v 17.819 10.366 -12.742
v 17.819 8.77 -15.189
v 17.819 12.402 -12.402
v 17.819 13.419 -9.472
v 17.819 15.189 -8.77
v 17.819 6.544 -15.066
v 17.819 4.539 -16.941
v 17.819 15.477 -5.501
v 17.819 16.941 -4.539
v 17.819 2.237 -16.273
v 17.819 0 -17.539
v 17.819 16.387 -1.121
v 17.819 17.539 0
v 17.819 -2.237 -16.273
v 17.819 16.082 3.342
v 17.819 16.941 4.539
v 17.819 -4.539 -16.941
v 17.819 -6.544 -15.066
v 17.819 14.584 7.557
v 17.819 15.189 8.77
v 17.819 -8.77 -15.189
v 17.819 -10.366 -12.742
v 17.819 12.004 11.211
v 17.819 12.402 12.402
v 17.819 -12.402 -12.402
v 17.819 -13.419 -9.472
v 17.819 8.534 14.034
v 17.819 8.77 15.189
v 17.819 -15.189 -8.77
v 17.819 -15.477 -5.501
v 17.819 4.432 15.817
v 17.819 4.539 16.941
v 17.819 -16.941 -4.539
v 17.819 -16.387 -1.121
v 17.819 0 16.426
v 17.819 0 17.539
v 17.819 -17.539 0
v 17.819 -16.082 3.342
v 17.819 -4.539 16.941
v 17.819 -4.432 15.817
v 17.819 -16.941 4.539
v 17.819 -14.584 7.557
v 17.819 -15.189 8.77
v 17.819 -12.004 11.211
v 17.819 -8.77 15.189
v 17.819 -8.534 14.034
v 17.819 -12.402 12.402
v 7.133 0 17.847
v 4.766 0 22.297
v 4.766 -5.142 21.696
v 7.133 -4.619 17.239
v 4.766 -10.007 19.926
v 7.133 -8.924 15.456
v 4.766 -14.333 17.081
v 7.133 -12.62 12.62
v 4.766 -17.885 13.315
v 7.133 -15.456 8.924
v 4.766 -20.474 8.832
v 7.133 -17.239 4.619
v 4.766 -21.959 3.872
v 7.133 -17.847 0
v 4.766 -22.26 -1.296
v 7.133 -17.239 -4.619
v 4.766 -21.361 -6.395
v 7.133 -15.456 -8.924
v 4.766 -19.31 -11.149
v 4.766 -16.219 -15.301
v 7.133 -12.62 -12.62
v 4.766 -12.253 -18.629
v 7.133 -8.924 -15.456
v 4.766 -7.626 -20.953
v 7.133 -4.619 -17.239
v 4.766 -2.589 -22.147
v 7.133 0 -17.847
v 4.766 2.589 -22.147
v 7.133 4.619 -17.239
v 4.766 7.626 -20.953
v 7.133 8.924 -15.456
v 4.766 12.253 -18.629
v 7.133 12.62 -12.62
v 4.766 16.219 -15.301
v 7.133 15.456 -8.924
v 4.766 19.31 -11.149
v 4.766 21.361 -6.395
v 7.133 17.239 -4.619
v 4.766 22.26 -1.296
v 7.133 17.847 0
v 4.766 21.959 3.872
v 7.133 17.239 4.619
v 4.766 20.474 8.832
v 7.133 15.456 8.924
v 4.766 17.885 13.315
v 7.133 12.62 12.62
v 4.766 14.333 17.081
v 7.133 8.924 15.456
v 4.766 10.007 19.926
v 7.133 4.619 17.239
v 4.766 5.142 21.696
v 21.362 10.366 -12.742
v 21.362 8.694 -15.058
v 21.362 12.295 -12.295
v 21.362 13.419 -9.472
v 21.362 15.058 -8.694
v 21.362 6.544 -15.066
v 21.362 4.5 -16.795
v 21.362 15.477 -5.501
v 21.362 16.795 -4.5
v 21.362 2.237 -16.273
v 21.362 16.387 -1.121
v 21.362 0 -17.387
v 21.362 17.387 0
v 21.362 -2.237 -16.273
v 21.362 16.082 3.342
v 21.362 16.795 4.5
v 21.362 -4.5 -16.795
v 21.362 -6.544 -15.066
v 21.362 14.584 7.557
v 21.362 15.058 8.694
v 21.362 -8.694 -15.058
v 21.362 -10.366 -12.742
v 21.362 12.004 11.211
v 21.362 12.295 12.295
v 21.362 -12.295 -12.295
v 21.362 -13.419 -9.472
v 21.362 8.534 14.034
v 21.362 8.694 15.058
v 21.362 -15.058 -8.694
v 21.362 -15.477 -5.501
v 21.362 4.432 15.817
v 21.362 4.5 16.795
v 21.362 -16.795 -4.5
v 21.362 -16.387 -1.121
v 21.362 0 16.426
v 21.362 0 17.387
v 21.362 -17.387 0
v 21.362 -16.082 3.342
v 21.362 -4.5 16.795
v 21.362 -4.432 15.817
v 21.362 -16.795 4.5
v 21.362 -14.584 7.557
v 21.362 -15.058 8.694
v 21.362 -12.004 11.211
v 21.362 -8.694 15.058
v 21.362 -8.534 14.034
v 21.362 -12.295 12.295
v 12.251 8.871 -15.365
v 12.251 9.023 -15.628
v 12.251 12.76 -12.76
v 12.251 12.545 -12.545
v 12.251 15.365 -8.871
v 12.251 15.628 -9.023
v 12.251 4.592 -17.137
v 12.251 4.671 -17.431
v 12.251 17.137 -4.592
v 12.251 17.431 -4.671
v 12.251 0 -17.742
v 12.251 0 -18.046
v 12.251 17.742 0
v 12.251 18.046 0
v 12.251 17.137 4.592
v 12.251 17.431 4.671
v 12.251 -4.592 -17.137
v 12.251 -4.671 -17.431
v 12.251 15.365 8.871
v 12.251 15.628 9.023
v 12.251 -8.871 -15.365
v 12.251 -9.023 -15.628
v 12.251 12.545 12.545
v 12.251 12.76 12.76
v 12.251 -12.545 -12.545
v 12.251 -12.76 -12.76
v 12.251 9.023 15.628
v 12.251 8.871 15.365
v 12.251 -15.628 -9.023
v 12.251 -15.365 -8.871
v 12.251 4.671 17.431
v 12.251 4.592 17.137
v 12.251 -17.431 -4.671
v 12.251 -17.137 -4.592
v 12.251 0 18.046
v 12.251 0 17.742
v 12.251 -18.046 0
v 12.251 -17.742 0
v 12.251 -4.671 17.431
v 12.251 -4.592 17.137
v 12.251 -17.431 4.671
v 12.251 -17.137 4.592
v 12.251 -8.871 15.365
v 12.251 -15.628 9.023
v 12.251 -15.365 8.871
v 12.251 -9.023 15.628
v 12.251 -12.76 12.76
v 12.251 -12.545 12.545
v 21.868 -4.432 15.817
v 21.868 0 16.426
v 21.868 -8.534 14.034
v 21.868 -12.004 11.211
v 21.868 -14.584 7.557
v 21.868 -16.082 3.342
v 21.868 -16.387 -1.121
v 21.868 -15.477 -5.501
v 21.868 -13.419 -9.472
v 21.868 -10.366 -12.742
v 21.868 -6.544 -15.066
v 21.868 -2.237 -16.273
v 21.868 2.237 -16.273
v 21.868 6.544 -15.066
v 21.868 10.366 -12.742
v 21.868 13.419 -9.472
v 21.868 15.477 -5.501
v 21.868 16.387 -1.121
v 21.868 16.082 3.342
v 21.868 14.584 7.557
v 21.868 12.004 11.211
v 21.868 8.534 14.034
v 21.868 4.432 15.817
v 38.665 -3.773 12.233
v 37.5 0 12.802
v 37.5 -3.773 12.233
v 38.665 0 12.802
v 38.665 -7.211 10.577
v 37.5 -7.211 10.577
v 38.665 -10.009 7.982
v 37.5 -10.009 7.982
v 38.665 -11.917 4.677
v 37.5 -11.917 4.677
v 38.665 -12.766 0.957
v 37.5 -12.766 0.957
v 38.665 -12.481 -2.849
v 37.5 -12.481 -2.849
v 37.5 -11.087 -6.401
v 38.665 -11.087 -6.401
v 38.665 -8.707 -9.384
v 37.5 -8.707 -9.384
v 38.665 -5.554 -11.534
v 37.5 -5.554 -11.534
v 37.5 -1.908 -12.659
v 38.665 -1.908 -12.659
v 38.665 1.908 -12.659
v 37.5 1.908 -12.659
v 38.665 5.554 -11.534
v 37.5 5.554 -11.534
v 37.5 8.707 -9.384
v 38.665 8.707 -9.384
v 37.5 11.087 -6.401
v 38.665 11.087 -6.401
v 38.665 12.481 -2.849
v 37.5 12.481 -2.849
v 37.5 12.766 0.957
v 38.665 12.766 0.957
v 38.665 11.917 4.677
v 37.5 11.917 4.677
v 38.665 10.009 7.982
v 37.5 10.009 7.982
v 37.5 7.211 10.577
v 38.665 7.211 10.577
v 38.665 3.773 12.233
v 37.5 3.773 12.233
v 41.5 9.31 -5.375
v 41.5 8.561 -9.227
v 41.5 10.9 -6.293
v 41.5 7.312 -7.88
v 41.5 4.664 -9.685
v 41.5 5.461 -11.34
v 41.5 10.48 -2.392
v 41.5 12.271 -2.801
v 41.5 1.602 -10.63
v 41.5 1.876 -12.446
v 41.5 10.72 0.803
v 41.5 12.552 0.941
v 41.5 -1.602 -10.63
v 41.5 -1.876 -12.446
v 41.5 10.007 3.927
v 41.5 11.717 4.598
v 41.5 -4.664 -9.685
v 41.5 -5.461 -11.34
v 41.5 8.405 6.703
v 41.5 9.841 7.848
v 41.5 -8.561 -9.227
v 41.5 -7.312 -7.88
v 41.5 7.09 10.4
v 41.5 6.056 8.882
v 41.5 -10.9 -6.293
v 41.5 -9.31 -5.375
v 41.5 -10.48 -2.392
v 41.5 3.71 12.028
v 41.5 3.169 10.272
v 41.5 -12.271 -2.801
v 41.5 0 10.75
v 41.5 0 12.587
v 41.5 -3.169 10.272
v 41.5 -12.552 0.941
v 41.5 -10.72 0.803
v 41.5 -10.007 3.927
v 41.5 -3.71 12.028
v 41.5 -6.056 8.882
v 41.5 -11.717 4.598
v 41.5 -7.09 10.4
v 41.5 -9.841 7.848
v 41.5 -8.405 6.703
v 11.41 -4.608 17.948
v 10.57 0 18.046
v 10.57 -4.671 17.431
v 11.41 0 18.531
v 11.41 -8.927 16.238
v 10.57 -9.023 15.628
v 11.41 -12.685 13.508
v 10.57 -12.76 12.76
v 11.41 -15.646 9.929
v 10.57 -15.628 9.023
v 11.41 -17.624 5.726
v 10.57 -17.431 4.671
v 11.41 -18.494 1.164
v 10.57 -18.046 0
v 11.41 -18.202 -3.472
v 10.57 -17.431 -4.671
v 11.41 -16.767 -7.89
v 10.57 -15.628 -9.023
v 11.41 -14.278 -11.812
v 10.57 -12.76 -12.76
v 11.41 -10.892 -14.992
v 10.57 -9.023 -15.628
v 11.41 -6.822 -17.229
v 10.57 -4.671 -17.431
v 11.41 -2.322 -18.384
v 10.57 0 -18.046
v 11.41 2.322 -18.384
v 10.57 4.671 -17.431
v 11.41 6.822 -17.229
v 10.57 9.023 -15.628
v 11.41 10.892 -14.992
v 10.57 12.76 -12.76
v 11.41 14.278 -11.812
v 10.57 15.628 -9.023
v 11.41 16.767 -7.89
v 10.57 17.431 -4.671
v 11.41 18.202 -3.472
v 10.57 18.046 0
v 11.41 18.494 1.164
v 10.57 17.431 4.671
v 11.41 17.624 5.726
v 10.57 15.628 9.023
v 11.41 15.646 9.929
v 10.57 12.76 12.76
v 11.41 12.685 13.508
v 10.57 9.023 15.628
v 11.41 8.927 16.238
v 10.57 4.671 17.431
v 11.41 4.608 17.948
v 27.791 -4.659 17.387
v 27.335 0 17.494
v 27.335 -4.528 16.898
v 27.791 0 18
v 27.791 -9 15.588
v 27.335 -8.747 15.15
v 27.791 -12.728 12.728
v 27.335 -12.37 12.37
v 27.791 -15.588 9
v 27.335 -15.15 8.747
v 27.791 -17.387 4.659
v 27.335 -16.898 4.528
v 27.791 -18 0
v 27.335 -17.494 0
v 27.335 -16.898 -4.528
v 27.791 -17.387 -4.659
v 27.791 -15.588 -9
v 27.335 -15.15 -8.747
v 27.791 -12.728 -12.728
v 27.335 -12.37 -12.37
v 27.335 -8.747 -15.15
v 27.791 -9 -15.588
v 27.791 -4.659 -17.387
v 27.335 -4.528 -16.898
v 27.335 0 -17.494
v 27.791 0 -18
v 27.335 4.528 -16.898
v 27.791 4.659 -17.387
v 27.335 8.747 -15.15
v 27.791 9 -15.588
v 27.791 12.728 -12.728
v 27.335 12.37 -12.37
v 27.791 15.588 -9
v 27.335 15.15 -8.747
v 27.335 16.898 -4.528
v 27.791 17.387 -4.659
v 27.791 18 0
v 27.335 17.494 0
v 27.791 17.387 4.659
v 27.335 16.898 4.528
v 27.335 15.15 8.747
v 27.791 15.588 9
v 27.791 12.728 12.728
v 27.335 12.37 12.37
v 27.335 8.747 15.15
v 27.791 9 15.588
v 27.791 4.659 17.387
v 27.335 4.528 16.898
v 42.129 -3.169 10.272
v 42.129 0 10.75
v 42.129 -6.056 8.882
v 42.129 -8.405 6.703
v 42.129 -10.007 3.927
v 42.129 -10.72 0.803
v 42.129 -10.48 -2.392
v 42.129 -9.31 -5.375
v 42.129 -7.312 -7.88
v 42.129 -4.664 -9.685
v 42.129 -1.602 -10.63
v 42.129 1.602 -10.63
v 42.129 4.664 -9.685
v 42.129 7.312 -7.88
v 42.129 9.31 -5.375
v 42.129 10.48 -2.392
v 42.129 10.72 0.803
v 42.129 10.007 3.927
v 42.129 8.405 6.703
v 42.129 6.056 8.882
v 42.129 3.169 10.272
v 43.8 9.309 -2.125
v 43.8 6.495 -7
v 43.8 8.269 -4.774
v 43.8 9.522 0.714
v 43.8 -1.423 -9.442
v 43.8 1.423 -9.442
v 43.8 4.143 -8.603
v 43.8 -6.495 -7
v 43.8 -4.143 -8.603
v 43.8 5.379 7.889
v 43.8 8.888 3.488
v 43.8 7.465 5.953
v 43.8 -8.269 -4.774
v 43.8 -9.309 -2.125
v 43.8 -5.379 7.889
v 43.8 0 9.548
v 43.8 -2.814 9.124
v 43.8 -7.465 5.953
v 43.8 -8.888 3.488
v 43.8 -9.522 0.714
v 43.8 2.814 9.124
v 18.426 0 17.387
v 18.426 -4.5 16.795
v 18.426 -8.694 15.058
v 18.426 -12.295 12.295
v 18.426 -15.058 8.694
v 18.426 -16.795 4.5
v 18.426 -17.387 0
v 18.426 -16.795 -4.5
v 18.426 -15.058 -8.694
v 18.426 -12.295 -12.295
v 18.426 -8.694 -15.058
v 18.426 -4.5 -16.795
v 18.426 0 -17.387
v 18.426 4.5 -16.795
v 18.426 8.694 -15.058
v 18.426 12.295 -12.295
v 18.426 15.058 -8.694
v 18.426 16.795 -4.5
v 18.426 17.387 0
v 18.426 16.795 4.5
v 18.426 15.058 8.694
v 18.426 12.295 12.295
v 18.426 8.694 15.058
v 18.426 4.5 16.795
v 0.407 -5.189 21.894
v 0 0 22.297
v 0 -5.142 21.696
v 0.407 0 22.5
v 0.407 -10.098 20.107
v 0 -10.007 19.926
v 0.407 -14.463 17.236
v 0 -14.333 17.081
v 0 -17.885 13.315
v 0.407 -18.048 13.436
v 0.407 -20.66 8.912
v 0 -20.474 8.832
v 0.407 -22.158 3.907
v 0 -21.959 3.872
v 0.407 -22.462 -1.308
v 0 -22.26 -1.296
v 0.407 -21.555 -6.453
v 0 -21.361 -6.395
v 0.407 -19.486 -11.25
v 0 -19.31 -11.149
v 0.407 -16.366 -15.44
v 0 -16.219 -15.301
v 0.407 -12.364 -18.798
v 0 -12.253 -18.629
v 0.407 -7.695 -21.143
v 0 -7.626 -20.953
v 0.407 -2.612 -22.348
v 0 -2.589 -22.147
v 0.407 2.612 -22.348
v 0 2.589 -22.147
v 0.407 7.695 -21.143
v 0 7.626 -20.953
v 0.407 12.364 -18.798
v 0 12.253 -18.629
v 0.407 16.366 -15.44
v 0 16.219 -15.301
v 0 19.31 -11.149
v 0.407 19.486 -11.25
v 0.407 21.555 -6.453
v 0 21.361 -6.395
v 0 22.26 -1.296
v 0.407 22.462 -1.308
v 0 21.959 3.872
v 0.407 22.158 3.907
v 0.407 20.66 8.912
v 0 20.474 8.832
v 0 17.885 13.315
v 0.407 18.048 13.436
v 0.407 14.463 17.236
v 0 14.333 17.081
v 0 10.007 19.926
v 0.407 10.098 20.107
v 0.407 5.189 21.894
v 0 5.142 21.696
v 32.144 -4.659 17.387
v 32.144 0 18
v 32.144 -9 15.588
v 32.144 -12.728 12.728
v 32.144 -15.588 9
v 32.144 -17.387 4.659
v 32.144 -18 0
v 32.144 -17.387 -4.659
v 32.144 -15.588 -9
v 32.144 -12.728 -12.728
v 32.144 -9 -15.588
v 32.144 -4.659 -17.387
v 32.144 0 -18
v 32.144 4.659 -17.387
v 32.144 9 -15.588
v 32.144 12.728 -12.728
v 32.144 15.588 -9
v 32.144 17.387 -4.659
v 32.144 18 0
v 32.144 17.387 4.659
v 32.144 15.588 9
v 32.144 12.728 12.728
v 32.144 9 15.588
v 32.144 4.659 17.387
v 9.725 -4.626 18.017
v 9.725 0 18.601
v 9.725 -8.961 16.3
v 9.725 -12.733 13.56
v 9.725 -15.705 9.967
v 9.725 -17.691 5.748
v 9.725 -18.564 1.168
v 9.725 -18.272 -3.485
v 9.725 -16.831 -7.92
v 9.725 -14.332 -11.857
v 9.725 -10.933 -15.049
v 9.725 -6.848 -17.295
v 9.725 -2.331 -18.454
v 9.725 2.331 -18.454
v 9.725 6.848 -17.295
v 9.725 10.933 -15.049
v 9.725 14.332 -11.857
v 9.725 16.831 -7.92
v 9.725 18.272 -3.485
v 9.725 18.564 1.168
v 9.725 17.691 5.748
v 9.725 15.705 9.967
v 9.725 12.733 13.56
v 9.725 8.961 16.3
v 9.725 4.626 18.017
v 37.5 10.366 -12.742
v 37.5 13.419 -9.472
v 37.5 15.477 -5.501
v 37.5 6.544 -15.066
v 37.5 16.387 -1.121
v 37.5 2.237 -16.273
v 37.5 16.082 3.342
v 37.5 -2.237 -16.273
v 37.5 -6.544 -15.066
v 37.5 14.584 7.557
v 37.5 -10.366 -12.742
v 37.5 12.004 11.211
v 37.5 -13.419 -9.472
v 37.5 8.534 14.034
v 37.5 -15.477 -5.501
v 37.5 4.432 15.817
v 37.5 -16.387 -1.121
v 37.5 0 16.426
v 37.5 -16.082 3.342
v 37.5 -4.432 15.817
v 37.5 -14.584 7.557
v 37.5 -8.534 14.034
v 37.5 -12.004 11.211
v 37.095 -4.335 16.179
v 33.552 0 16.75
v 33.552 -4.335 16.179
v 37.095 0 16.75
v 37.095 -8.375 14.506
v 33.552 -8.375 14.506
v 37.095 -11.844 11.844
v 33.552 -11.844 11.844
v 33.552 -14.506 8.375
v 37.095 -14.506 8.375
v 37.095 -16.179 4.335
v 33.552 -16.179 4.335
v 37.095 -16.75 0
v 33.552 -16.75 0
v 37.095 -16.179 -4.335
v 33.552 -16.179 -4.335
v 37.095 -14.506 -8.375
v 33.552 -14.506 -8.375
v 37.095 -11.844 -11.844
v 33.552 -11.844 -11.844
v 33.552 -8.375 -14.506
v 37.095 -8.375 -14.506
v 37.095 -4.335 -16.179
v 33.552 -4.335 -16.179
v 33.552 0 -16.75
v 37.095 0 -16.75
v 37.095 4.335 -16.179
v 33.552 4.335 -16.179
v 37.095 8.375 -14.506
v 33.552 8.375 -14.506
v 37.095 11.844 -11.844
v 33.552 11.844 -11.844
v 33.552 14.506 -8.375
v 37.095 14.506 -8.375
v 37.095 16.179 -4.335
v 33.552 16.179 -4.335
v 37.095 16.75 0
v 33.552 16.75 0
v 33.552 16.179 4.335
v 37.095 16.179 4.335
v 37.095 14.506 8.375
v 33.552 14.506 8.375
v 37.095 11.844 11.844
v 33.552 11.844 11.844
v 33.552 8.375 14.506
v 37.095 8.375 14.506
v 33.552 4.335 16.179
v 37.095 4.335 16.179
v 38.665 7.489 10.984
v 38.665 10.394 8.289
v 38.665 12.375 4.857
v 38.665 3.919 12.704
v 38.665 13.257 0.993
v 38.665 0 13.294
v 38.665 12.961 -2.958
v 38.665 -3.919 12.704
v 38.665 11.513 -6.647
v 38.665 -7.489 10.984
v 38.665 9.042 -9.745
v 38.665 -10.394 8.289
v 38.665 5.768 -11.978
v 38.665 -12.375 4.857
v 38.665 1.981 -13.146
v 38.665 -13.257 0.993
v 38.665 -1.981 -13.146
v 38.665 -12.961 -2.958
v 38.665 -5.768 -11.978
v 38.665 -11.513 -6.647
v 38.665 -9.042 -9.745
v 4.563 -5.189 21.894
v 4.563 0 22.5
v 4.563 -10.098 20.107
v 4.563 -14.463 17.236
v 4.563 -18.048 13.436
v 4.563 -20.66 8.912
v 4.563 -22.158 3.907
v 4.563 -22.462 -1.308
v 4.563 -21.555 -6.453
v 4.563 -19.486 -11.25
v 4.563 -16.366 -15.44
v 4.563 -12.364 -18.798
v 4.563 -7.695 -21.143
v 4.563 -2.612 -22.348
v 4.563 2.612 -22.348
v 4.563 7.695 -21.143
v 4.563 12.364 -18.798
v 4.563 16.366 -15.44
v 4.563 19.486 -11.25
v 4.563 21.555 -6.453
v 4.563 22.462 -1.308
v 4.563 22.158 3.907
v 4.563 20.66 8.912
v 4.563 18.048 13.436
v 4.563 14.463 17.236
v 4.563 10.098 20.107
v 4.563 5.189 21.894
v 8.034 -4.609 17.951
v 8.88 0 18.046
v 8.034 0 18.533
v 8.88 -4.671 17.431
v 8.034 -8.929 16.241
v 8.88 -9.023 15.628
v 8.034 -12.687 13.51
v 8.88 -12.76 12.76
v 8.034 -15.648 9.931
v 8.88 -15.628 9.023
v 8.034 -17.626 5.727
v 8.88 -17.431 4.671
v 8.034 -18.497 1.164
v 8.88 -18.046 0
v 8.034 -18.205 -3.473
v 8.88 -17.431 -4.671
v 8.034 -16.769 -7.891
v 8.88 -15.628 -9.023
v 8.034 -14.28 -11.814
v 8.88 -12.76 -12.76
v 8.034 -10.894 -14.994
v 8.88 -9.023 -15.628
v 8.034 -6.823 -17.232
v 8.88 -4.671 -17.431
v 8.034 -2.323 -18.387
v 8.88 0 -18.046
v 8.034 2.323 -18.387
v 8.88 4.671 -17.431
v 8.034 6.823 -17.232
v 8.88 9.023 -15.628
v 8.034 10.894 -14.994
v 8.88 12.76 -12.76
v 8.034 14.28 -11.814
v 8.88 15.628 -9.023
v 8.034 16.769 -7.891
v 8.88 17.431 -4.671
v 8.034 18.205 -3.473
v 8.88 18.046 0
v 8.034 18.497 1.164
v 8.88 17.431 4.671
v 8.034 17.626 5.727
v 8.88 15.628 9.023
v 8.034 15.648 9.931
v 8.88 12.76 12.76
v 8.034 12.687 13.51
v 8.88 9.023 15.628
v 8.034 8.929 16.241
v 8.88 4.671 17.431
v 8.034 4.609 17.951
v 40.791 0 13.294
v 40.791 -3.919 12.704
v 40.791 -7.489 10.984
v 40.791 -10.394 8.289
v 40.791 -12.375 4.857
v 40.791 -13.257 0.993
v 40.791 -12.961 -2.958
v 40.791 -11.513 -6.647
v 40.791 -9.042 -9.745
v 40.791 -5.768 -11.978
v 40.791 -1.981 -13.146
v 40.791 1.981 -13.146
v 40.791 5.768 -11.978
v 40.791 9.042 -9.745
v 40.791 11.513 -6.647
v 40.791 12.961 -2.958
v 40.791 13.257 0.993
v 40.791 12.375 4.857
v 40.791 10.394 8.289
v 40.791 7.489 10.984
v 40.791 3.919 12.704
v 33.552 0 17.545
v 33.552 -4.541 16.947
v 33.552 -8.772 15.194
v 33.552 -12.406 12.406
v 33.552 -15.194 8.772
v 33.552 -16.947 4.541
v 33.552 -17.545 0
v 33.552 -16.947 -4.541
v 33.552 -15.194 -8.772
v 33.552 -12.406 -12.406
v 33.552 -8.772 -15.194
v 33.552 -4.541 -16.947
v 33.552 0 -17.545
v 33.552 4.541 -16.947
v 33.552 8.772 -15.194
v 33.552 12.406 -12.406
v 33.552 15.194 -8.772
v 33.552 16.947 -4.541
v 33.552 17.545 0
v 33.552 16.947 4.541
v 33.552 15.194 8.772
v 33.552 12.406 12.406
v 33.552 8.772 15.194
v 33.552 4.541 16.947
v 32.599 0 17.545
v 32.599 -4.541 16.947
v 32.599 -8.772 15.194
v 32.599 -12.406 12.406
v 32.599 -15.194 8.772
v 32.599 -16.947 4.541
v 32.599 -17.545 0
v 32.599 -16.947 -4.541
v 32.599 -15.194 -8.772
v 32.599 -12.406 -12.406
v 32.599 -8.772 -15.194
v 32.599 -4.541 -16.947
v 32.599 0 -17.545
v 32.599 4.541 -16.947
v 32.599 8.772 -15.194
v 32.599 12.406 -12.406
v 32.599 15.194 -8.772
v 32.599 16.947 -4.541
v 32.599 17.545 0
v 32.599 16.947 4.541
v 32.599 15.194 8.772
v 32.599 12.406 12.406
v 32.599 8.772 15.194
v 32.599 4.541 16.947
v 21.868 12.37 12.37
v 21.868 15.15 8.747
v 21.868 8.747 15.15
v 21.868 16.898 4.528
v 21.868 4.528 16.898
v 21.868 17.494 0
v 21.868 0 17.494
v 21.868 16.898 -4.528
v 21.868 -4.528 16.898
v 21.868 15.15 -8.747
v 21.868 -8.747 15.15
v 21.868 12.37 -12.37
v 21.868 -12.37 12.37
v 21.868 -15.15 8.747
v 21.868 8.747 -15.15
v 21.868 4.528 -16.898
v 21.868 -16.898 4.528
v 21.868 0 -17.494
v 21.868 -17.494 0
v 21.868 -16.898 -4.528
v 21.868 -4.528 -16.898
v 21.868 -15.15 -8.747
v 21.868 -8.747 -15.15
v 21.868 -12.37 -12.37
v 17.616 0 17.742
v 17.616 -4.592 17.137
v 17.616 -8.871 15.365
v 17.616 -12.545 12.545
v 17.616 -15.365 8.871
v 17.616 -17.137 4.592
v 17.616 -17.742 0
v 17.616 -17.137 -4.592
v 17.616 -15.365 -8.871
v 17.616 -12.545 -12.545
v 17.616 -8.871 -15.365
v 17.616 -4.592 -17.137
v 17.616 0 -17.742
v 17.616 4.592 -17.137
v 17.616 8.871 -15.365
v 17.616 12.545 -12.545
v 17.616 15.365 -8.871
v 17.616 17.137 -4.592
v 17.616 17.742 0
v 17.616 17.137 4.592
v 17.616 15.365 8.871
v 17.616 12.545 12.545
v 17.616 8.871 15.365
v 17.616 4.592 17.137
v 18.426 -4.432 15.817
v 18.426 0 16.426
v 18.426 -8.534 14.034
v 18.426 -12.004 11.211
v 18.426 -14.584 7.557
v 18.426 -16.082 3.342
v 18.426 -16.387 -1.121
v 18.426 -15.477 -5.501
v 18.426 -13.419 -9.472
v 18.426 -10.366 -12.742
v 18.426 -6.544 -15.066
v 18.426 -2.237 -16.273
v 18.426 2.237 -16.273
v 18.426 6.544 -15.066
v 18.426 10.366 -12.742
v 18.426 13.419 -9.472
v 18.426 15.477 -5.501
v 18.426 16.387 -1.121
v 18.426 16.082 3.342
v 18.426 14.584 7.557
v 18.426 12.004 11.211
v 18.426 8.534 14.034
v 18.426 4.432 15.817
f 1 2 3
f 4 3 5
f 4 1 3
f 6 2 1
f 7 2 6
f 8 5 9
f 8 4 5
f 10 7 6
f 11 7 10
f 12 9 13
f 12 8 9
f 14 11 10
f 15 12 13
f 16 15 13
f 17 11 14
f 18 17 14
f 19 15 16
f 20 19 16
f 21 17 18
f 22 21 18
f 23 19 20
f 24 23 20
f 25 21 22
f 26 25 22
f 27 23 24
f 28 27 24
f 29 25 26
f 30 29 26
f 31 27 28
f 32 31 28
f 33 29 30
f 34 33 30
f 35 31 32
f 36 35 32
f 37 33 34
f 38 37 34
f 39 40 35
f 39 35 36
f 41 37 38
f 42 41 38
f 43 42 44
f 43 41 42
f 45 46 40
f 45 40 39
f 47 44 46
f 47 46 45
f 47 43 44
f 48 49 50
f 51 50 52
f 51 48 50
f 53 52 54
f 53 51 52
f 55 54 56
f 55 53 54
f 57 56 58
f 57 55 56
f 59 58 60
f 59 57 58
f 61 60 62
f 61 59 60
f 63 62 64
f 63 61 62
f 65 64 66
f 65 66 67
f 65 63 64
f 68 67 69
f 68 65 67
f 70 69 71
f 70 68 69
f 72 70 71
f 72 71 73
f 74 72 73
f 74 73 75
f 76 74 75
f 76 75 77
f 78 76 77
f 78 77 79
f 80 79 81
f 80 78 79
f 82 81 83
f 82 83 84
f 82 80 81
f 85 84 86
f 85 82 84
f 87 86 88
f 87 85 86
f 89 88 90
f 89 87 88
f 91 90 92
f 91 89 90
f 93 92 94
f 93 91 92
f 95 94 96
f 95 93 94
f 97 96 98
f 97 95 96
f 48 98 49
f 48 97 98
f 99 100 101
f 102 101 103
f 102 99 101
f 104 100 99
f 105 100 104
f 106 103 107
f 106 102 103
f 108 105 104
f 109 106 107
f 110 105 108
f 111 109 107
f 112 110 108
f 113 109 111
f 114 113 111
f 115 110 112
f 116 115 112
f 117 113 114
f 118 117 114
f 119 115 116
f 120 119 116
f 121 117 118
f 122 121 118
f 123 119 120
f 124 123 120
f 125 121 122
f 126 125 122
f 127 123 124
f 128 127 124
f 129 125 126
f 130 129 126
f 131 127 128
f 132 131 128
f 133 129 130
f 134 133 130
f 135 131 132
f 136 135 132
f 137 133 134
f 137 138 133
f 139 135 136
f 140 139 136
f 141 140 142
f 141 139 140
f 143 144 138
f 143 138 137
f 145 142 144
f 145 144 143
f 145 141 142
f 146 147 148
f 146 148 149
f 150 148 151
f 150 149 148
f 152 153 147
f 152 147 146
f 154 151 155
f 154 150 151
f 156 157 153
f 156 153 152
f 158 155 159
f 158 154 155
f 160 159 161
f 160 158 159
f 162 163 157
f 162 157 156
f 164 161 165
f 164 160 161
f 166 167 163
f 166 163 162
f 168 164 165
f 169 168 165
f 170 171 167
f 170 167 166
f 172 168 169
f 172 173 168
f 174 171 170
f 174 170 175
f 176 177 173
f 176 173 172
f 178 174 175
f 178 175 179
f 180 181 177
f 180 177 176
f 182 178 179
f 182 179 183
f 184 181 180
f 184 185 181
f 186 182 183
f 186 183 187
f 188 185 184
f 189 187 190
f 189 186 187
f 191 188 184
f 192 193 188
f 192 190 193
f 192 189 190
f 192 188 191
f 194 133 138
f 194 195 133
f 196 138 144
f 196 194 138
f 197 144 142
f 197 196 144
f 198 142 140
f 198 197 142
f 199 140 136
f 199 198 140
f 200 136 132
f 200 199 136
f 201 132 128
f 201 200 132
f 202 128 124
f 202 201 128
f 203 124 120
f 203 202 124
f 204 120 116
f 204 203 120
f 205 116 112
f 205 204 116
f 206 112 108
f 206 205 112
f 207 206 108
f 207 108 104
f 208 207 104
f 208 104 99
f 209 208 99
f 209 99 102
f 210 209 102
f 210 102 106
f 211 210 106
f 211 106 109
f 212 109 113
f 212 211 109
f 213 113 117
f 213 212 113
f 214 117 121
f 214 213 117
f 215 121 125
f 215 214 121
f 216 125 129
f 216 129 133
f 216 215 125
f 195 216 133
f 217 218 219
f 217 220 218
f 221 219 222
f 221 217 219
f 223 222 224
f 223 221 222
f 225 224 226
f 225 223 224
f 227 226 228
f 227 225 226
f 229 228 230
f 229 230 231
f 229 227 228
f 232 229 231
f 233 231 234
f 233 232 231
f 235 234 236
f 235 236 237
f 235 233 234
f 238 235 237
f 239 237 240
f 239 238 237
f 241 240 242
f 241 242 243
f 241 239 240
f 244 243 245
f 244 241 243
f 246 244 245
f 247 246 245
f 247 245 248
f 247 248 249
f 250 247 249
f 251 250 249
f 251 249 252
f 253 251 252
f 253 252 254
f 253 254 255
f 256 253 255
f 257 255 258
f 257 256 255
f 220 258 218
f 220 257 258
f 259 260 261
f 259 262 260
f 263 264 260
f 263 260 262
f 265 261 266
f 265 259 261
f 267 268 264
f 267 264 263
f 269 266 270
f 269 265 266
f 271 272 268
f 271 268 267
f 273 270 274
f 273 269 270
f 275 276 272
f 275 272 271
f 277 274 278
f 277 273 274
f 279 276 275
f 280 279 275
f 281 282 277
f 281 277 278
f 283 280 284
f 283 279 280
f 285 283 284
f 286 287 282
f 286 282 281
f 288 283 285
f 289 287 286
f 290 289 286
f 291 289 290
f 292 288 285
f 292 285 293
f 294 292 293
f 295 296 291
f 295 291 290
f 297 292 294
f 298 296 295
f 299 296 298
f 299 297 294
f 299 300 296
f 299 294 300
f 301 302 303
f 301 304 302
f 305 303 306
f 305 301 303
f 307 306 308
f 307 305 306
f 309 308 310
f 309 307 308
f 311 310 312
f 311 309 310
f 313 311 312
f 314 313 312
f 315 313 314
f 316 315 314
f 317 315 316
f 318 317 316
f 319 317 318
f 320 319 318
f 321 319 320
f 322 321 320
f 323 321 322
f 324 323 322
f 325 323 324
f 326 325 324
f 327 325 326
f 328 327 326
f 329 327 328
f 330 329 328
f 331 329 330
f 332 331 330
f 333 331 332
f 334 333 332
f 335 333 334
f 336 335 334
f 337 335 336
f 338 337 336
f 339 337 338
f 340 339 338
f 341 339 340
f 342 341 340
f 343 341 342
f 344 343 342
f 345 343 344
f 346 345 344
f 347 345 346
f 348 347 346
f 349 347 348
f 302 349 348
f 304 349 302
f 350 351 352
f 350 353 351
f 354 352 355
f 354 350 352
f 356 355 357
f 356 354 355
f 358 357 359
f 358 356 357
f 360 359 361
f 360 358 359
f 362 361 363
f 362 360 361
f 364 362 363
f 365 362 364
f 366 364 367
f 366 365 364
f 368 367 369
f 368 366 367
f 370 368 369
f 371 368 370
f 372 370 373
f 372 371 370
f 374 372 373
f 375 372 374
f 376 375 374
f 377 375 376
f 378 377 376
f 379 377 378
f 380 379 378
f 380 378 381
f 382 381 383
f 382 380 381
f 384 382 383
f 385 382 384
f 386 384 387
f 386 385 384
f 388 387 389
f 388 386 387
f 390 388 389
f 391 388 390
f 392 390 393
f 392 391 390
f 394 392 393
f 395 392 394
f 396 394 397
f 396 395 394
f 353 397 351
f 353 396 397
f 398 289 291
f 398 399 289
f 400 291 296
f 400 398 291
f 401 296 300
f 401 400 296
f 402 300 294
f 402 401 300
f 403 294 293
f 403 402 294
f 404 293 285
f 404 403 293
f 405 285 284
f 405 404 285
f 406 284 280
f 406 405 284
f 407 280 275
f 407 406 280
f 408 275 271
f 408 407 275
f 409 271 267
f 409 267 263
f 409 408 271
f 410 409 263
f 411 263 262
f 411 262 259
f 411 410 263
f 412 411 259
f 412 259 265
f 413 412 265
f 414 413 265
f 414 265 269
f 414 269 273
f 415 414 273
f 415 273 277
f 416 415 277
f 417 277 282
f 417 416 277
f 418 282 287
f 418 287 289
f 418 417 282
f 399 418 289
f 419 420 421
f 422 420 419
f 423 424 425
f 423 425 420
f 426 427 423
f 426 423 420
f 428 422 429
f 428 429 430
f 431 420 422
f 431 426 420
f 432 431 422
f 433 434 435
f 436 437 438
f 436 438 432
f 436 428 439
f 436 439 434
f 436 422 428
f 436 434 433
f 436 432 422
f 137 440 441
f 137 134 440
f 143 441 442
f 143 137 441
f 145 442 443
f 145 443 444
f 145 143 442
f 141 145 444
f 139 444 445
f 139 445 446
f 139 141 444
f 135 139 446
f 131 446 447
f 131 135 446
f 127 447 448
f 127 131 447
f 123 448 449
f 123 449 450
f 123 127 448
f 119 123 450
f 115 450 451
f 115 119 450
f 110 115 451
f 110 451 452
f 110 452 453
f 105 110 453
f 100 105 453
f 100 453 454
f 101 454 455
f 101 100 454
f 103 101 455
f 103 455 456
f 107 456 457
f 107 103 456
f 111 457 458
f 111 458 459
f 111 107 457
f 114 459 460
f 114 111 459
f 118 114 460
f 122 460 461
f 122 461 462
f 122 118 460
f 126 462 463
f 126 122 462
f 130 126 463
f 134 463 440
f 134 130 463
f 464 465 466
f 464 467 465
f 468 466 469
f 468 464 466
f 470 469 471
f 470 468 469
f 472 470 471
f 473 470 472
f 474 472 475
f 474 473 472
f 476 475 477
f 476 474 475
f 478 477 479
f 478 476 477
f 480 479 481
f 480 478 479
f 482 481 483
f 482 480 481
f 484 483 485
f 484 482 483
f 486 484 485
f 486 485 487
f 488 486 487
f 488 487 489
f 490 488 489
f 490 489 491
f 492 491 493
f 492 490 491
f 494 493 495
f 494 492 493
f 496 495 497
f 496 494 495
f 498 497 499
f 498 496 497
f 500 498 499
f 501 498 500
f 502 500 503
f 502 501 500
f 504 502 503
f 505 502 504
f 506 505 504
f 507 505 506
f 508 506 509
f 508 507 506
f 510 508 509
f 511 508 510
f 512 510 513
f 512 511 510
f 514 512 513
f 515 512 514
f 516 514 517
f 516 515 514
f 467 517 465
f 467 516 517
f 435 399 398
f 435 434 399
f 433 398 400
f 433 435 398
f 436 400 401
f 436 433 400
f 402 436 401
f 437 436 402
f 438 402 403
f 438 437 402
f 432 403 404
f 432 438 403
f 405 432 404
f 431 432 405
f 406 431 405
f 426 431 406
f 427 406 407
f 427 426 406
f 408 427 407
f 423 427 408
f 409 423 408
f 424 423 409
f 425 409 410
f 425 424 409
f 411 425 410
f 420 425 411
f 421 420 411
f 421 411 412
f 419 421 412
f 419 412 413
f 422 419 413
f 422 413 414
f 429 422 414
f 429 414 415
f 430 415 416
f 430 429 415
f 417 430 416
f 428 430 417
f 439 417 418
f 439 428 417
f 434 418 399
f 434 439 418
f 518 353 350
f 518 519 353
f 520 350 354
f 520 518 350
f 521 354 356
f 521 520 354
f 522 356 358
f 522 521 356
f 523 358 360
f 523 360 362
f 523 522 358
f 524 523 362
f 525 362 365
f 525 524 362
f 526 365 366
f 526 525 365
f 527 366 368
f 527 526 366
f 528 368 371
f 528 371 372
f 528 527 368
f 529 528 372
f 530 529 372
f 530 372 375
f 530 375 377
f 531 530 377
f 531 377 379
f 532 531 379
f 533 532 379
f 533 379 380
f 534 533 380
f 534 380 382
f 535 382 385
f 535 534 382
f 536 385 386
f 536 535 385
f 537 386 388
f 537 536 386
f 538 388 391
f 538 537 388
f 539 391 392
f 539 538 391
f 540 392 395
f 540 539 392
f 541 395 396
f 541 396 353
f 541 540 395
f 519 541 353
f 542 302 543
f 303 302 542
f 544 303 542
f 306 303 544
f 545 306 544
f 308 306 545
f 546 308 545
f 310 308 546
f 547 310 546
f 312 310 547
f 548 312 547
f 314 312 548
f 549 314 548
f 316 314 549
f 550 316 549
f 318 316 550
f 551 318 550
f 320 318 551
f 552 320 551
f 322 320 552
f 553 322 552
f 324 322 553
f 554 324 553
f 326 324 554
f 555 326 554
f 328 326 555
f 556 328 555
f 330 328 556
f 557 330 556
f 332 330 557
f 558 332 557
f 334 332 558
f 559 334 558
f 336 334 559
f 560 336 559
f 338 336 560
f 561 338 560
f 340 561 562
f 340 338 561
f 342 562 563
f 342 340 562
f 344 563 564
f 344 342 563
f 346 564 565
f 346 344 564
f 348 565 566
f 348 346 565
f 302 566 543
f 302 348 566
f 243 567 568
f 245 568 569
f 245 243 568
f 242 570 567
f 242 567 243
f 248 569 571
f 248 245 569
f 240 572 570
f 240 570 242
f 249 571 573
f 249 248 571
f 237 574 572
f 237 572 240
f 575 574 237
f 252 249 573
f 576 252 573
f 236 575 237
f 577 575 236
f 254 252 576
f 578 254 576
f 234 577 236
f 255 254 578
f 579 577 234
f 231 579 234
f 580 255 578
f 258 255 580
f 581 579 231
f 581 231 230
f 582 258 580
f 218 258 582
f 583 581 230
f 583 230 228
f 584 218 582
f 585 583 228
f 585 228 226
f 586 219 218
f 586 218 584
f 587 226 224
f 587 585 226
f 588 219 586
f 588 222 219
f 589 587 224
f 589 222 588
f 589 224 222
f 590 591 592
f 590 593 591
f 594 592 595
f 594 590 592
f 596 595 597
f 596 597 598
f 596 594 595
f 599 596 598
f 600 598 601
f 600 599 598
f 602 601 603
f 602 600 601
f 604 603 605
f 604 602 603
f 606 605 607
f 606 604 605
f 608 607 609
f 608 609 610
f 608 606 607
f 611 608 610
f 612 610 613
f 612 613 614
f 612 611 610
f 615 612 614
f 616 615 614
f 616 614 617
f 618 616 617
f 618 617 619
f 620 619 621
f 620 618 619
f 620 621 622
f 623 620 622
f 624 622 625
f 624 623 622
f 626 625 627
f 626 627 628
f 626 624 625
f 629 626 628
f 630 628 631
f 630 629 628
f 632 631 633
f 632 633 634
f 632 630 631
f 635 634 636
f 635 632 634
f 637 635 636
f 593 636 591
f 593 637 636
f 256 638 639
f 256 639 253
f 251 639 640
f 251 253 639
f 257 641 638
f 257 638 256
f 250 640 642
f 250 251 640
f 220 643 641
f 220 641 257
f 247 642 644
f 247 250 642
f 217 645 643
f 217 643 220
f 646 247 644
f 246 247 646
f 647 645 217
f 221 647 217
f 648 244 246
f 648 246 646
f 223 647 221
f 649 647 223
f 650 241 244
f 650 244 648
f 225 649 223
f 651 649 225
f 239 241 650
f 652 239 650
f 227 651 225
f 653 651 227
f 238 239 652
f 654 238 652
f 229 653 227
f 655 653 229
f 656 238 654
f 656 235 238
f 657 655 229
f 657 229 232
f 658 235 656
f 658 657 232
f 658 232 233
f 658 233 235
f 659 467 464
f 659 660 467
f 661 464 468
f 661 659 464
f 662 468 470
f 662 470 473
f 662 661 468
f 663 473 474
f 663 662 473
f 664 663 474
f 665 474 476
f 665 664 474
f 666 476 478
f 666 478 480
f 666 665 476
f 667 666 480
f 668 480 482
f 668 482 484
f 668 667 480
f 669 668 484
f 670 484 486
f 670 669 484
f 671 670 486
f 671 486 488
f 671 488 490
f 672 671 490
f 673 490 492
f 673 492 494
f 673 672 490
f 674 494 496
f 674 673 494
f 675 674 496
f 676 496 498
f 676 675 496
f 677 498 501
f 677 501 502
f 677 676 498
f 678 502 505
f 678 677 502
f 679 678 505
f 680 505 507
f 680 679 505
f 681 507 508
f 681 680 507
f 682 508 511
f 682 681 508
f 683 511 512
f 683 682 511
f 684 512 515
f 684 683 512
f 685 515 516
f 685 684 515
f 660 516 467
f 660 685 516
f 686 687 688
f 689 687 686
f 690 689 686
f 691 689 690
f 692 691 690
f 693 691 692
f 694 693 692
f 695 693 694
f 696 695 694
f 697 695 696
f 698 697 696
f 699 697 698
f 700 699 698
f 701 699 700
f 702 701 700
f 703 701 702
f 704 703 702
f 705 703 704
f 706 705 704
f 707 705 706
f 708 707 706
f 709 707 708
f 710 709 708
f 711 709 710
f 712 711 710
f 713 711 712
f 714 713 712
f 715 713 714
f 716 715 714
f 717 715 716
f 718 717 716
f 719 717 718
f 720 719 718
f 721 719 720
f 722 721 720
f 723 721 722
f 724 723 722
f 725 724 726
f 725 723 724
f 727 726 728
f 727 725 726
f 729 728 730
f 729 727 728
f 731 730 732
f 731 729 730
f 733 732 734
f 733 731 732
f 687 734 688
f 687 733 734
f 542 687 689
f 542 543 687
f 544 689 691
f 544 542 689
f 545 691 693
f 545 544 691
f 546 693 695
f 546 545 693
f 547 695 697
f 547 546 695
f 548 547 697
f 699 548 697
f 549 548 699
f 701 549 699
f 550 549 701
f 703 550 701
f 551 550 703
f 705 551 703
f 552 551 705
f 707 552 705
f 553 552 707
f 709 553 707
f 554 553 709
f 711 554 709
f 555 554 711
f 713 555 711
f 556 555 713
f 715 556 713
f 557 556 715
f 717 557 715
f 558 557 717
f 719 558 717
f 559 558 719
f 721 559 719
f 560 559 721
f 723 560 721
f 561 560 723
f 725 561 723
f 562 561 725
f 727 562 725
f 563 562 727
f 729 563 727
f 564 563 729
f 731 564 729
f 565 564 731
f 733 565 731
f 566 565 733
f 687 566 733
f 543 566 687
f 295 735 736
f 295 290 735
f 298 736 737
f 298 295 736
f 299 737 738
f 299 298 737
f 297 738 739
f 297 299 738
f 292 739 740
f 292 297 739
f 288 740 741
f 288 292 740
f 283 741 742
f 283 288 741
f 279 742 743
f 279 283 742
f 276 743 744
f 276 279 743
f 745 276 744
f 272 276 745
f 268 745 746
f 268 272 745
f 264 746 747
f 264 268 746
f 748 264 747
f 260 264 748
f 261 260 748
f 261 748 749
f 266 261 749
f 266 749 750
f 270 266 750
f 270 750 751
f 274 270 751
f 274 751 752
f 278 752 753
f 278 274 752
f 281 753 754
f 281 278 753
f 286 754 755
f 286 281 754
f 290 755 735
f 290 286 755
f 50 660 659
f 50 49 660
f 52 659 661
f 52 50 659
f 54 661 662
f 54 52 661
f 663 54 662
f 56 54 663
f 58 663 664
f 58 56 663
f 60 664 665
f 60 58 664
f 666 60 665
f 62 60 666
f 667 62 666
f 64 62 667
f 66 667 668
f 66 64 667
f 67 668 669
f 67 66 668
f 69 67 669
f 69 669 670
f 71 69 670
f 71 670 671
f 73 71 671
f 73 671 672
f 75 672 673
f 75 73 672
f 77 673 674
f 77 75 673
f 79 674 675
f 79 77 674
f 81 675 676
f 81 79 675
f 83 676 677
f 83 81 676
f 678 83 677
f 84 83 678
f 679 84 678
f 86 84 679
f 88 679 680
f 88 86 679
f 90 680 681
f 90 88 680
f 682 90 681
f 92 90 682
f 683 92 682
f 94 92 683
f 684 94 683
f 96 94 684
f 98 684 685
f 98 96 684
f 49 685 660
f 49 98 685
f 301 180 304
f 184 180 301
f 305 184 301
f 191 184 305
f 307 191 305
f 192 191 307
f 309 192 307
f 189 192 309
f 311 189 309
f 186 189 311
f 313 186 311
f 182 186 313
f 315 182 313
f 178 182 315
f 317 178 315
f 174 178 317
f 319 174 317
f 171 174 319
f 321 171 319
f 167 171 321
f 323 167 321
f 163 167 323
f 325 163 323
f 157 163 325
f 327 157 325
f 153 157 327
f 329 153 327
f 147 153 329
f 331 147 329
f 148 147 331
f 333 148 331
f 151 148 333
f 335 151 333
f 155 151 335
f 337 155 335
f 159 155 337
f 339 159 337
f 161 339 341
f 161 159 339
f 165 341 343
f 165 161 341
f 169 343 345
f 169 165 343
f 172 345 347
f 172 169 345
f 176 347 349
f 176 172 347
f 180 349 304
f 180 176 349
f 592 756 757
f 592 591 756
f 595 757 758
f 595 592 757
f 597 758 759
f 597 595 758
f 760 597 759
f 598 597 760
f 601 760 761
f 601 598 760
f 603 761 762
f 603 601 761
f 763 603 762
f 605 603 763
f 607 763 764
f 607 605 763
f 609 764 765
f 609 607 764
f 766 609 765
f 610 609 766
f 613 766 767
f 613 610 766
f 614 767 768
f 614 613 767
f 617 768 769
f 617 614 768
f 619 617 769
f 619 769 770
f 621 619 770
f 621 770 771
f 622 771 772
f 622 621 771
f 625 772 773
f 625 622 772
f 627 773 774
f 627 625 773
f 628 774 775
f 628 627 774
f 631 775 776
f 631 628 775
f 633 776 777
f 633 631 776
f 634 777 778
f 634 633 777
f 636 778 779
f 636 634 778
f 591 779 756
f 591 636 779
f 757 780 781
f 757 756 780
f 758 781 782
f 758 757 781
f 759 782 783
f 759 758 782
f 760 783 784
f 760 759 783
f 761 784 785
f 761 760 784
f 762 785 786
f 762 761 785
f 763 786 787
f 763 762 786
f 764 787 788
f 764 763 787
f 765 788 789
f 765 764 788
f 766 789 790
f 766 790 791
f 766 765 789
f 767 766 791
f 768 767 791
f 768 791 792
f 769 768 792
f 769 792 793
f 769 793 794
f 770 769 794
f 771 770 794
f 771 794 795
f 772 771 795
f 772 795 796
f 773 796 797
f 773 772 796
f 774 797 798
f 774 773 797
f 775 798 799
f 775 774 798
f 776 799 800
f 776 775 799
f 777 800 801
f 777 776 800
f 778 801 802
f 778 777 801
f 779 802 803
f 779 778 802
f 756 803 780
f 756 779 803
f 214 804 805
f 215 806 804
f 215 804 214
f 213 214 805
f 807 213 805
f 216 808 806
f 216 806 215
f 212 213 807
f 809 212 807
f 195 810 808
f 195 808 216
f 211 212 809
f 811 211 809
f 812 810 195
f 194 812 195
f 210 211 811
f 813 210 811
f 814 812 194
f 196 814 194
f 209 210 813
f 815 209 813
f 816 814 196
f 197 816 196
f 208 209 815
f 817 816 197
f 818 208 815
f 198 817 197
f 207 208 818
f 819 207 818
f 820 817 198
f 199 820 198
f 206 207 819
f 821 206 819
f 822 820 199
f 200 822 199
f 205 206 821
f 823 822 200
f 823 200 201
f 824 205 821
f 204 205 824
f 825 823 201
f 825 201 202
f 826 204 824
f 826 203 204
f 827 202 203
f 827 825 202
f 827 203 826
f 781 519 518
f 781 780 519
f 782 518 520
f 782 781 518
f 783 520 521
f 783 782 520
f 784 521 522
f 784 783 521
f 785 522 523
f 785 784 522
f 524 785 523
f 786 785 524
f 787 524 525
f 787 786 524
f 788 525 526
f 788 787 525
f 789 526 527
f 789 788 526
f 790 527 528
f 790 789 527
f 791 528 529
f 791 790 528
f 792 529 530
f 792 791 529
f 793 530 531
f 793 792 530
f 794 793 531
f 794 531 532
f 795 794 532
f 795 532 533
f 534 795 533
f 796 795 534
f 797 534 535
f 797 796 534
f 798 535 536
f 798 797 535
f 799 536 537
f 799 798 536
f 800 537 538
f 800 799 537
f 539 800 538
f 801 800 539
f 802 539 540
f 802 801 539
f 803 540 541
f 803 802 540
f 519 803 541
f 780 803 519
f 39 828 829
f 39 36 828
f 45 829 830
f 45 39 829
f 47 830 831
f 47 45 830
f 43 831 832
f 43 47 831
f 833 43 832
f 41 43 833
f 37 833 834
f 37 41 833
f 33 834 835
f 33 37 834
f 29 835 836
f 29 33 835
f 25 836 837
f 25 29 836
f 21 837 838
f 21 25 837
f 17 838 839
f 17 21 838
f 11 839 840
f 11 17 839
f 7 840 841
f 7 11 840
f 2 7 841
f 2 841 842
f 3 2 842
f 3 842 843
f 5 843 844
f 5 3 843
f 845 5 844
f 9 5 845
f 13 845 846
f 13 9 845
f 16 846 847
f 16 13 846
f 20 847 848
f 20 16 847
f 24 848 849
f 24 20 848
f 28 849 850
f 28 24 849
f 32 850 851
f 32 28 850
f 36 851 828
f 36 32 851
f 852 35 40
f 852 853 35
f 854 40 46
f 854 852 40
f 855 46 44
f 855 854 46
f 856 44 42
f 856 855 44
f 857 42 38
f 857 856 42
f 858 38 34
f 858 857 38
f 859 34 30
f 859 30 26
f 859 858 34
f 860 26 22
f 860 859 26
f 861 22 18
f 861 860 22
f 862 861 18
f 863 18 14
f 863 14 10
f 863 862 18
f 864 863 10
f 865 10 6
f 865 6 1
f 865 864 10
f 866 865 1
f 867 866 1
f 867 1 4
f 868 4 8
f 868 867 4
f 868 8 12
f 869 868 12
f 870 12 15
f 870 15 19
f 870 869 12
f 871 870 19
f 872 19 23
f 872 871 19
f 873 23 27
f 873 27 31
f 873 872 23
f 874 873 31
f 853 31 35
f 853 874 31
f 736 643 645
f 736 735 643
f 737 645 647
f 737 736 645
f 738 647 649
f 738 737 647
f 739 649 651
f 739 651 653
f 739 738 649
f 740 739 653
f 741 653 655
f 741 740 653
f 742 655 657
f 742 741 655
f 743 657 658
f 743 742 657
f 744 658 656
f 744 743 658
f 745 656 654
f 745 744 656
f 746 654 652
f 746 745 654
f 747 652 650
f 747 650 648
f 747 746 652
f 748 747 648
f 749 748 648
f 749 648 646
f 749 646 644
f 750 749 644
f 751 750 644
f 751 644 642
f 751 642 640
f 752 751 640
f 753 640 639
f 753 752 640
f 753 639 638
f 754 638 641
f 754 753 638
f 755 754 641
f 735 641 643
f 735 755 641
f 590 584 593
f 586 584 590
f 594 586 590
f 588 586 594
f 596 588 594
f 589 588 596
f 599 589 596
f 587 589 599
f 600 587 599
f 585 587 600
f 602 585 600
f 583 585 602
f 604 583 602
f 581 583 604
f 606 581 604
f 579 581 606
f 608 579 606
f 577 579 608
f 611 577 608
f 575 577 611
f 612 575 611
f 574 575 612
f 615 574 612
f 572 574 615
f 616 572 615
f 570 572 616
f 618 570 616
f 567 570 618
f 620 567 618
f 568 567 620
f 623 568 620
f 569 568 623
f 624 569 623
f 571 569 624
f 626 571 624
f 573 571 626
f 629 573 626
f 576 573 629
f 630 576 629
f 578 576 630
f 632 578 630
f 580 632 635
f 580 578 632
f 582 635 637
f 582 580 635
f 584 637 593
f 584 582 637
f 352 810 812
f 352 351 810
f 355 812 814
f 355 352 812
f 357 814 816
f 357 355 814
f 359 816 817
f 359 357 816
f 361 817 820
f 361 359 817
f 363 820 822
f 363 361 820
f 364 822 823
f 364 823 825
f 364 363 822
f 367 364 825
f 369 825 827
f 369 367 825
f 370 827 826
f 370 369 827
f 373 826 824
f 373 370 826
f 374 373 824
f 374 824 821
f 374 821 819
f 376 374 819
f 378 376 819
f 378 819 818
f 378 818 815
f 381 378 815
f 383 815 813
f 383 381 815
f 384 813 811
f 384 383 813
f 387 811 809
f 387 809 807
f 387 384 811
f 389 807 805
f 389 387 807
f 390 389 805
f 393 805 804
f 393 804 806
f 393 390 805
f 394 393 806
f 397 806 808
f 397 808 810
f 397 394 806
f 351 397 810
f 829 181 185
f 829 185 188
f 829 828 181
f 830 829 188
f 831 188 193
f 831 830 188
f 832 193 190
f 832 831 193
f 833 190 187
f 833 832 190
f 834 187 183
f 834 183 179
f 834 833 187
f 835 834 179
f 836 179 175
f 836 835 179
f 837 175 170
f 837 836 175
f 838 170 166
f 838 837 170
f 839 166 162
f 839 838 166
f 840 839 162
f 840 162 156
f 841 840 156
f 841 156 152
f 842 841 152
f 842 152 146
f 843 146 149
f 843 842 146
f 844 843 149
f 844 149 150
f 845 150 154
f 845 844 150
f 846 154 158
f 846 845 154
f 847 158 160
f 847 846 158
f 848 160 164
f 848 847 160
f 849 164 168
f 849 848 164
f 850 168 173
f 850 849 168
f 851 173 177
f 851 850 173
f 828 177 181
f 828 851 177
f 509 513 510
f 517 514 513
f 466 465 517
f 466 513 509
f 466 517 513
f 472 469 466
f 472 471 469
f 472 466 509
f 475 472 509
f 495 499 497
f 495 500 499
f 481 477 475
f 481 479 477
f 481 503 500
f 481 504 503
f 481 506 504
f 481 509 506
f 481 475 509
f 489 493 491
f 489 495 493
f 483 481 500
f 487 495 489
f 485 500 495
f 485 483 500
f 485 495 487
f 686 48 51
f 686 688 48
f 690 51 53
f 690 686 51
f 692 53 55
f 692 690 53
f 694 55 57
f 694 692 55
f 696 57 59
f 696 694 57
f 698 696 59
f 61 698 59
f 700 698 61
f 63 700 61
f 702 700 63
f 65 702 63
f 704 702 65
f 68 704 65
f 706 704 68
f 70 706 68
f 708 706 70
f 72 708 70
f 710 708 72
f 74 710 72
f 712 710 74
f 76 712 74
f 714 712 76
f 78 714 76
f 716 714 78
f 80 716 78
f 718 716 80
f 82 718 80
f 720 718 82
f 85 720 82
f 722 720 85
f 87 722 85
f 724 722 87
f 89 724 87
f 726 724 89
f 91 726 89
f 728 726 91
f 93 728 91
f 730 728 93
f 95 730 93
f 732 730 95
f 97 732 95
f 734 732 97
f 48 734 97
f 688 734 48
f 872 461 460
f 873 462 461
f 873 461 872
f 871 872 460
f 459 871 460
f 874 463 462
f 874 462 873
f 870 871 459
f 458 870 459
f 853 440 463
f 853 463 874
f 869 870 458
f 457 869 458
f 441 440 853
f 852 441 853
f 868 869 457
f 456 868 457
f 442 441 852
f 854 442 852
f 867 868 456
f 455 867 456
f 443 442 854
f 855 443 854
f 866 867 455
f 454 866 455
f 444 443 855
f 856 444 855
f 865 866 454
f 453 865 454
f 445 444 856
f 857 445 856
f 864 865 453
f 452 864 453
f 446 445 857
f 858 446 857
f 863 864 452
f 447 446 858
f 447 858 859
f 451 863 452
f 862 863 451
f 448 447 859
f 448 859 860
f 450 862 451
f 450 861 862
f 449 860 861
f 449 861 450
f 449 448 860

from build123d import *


with BuildPart() as part:
    # Model → Повернуть1 (revolve)
    with BuildSketch(Plane.XY, mode=Mode.PRIVATE) as revolve_1_sk:
        Polygon((0, 0), (0, -22.297439151), (0.406986693, -22.5), (4.563171418, -22.5), (4.765560012, -22.297439151), (7.132579794, -17.847080181), (8.034078204, -18.53333859), (8.879510019, -18.045513069), (9.72476958, -18.601092135), (10.570023757, -18.045513069), (11.410266397, -18.530582514), (12.250724355, -18.045513069), (12.250724355, -17.741666414), (17.616266787, -17.741666414), (17.818865316, -17.539062501), (17.818865316, -16.425629172), (18.426031098, -16.425629172), (18.426031098, -17.387144556), (21.362129874, -17.387144556), (21.362129874, -16.425629172), (21.868225167, -16.425629172), (21.868225167, -17.493893941), (27.334902683, -17.493893941), (27.790688815, -18), (32.143900705, -18), (32.599331562, -17.544536845), (33.552402733, -17.544536845), (33.552338057, -16.75), (37.095113357, -16.75), (37.5, -16.425629172), (37.5, -12.801691559), (38.665364669, -12.801691559), (38.665364669, -13.294307916), (40.791343859, -13.294307916), (41.5, -12.586706835), (41.5, -10.75), (42.129406807, -10.75), (43.8, -9.548466361), (43.8, 0), align=None)
    revolve(revolve_1_sk.sketch.rotate(Axis((0, 0, 0), (1, 0, 0)), 270), axis=Axis((0, 0, 0), (1, 0, 0)))


solid = part.part
